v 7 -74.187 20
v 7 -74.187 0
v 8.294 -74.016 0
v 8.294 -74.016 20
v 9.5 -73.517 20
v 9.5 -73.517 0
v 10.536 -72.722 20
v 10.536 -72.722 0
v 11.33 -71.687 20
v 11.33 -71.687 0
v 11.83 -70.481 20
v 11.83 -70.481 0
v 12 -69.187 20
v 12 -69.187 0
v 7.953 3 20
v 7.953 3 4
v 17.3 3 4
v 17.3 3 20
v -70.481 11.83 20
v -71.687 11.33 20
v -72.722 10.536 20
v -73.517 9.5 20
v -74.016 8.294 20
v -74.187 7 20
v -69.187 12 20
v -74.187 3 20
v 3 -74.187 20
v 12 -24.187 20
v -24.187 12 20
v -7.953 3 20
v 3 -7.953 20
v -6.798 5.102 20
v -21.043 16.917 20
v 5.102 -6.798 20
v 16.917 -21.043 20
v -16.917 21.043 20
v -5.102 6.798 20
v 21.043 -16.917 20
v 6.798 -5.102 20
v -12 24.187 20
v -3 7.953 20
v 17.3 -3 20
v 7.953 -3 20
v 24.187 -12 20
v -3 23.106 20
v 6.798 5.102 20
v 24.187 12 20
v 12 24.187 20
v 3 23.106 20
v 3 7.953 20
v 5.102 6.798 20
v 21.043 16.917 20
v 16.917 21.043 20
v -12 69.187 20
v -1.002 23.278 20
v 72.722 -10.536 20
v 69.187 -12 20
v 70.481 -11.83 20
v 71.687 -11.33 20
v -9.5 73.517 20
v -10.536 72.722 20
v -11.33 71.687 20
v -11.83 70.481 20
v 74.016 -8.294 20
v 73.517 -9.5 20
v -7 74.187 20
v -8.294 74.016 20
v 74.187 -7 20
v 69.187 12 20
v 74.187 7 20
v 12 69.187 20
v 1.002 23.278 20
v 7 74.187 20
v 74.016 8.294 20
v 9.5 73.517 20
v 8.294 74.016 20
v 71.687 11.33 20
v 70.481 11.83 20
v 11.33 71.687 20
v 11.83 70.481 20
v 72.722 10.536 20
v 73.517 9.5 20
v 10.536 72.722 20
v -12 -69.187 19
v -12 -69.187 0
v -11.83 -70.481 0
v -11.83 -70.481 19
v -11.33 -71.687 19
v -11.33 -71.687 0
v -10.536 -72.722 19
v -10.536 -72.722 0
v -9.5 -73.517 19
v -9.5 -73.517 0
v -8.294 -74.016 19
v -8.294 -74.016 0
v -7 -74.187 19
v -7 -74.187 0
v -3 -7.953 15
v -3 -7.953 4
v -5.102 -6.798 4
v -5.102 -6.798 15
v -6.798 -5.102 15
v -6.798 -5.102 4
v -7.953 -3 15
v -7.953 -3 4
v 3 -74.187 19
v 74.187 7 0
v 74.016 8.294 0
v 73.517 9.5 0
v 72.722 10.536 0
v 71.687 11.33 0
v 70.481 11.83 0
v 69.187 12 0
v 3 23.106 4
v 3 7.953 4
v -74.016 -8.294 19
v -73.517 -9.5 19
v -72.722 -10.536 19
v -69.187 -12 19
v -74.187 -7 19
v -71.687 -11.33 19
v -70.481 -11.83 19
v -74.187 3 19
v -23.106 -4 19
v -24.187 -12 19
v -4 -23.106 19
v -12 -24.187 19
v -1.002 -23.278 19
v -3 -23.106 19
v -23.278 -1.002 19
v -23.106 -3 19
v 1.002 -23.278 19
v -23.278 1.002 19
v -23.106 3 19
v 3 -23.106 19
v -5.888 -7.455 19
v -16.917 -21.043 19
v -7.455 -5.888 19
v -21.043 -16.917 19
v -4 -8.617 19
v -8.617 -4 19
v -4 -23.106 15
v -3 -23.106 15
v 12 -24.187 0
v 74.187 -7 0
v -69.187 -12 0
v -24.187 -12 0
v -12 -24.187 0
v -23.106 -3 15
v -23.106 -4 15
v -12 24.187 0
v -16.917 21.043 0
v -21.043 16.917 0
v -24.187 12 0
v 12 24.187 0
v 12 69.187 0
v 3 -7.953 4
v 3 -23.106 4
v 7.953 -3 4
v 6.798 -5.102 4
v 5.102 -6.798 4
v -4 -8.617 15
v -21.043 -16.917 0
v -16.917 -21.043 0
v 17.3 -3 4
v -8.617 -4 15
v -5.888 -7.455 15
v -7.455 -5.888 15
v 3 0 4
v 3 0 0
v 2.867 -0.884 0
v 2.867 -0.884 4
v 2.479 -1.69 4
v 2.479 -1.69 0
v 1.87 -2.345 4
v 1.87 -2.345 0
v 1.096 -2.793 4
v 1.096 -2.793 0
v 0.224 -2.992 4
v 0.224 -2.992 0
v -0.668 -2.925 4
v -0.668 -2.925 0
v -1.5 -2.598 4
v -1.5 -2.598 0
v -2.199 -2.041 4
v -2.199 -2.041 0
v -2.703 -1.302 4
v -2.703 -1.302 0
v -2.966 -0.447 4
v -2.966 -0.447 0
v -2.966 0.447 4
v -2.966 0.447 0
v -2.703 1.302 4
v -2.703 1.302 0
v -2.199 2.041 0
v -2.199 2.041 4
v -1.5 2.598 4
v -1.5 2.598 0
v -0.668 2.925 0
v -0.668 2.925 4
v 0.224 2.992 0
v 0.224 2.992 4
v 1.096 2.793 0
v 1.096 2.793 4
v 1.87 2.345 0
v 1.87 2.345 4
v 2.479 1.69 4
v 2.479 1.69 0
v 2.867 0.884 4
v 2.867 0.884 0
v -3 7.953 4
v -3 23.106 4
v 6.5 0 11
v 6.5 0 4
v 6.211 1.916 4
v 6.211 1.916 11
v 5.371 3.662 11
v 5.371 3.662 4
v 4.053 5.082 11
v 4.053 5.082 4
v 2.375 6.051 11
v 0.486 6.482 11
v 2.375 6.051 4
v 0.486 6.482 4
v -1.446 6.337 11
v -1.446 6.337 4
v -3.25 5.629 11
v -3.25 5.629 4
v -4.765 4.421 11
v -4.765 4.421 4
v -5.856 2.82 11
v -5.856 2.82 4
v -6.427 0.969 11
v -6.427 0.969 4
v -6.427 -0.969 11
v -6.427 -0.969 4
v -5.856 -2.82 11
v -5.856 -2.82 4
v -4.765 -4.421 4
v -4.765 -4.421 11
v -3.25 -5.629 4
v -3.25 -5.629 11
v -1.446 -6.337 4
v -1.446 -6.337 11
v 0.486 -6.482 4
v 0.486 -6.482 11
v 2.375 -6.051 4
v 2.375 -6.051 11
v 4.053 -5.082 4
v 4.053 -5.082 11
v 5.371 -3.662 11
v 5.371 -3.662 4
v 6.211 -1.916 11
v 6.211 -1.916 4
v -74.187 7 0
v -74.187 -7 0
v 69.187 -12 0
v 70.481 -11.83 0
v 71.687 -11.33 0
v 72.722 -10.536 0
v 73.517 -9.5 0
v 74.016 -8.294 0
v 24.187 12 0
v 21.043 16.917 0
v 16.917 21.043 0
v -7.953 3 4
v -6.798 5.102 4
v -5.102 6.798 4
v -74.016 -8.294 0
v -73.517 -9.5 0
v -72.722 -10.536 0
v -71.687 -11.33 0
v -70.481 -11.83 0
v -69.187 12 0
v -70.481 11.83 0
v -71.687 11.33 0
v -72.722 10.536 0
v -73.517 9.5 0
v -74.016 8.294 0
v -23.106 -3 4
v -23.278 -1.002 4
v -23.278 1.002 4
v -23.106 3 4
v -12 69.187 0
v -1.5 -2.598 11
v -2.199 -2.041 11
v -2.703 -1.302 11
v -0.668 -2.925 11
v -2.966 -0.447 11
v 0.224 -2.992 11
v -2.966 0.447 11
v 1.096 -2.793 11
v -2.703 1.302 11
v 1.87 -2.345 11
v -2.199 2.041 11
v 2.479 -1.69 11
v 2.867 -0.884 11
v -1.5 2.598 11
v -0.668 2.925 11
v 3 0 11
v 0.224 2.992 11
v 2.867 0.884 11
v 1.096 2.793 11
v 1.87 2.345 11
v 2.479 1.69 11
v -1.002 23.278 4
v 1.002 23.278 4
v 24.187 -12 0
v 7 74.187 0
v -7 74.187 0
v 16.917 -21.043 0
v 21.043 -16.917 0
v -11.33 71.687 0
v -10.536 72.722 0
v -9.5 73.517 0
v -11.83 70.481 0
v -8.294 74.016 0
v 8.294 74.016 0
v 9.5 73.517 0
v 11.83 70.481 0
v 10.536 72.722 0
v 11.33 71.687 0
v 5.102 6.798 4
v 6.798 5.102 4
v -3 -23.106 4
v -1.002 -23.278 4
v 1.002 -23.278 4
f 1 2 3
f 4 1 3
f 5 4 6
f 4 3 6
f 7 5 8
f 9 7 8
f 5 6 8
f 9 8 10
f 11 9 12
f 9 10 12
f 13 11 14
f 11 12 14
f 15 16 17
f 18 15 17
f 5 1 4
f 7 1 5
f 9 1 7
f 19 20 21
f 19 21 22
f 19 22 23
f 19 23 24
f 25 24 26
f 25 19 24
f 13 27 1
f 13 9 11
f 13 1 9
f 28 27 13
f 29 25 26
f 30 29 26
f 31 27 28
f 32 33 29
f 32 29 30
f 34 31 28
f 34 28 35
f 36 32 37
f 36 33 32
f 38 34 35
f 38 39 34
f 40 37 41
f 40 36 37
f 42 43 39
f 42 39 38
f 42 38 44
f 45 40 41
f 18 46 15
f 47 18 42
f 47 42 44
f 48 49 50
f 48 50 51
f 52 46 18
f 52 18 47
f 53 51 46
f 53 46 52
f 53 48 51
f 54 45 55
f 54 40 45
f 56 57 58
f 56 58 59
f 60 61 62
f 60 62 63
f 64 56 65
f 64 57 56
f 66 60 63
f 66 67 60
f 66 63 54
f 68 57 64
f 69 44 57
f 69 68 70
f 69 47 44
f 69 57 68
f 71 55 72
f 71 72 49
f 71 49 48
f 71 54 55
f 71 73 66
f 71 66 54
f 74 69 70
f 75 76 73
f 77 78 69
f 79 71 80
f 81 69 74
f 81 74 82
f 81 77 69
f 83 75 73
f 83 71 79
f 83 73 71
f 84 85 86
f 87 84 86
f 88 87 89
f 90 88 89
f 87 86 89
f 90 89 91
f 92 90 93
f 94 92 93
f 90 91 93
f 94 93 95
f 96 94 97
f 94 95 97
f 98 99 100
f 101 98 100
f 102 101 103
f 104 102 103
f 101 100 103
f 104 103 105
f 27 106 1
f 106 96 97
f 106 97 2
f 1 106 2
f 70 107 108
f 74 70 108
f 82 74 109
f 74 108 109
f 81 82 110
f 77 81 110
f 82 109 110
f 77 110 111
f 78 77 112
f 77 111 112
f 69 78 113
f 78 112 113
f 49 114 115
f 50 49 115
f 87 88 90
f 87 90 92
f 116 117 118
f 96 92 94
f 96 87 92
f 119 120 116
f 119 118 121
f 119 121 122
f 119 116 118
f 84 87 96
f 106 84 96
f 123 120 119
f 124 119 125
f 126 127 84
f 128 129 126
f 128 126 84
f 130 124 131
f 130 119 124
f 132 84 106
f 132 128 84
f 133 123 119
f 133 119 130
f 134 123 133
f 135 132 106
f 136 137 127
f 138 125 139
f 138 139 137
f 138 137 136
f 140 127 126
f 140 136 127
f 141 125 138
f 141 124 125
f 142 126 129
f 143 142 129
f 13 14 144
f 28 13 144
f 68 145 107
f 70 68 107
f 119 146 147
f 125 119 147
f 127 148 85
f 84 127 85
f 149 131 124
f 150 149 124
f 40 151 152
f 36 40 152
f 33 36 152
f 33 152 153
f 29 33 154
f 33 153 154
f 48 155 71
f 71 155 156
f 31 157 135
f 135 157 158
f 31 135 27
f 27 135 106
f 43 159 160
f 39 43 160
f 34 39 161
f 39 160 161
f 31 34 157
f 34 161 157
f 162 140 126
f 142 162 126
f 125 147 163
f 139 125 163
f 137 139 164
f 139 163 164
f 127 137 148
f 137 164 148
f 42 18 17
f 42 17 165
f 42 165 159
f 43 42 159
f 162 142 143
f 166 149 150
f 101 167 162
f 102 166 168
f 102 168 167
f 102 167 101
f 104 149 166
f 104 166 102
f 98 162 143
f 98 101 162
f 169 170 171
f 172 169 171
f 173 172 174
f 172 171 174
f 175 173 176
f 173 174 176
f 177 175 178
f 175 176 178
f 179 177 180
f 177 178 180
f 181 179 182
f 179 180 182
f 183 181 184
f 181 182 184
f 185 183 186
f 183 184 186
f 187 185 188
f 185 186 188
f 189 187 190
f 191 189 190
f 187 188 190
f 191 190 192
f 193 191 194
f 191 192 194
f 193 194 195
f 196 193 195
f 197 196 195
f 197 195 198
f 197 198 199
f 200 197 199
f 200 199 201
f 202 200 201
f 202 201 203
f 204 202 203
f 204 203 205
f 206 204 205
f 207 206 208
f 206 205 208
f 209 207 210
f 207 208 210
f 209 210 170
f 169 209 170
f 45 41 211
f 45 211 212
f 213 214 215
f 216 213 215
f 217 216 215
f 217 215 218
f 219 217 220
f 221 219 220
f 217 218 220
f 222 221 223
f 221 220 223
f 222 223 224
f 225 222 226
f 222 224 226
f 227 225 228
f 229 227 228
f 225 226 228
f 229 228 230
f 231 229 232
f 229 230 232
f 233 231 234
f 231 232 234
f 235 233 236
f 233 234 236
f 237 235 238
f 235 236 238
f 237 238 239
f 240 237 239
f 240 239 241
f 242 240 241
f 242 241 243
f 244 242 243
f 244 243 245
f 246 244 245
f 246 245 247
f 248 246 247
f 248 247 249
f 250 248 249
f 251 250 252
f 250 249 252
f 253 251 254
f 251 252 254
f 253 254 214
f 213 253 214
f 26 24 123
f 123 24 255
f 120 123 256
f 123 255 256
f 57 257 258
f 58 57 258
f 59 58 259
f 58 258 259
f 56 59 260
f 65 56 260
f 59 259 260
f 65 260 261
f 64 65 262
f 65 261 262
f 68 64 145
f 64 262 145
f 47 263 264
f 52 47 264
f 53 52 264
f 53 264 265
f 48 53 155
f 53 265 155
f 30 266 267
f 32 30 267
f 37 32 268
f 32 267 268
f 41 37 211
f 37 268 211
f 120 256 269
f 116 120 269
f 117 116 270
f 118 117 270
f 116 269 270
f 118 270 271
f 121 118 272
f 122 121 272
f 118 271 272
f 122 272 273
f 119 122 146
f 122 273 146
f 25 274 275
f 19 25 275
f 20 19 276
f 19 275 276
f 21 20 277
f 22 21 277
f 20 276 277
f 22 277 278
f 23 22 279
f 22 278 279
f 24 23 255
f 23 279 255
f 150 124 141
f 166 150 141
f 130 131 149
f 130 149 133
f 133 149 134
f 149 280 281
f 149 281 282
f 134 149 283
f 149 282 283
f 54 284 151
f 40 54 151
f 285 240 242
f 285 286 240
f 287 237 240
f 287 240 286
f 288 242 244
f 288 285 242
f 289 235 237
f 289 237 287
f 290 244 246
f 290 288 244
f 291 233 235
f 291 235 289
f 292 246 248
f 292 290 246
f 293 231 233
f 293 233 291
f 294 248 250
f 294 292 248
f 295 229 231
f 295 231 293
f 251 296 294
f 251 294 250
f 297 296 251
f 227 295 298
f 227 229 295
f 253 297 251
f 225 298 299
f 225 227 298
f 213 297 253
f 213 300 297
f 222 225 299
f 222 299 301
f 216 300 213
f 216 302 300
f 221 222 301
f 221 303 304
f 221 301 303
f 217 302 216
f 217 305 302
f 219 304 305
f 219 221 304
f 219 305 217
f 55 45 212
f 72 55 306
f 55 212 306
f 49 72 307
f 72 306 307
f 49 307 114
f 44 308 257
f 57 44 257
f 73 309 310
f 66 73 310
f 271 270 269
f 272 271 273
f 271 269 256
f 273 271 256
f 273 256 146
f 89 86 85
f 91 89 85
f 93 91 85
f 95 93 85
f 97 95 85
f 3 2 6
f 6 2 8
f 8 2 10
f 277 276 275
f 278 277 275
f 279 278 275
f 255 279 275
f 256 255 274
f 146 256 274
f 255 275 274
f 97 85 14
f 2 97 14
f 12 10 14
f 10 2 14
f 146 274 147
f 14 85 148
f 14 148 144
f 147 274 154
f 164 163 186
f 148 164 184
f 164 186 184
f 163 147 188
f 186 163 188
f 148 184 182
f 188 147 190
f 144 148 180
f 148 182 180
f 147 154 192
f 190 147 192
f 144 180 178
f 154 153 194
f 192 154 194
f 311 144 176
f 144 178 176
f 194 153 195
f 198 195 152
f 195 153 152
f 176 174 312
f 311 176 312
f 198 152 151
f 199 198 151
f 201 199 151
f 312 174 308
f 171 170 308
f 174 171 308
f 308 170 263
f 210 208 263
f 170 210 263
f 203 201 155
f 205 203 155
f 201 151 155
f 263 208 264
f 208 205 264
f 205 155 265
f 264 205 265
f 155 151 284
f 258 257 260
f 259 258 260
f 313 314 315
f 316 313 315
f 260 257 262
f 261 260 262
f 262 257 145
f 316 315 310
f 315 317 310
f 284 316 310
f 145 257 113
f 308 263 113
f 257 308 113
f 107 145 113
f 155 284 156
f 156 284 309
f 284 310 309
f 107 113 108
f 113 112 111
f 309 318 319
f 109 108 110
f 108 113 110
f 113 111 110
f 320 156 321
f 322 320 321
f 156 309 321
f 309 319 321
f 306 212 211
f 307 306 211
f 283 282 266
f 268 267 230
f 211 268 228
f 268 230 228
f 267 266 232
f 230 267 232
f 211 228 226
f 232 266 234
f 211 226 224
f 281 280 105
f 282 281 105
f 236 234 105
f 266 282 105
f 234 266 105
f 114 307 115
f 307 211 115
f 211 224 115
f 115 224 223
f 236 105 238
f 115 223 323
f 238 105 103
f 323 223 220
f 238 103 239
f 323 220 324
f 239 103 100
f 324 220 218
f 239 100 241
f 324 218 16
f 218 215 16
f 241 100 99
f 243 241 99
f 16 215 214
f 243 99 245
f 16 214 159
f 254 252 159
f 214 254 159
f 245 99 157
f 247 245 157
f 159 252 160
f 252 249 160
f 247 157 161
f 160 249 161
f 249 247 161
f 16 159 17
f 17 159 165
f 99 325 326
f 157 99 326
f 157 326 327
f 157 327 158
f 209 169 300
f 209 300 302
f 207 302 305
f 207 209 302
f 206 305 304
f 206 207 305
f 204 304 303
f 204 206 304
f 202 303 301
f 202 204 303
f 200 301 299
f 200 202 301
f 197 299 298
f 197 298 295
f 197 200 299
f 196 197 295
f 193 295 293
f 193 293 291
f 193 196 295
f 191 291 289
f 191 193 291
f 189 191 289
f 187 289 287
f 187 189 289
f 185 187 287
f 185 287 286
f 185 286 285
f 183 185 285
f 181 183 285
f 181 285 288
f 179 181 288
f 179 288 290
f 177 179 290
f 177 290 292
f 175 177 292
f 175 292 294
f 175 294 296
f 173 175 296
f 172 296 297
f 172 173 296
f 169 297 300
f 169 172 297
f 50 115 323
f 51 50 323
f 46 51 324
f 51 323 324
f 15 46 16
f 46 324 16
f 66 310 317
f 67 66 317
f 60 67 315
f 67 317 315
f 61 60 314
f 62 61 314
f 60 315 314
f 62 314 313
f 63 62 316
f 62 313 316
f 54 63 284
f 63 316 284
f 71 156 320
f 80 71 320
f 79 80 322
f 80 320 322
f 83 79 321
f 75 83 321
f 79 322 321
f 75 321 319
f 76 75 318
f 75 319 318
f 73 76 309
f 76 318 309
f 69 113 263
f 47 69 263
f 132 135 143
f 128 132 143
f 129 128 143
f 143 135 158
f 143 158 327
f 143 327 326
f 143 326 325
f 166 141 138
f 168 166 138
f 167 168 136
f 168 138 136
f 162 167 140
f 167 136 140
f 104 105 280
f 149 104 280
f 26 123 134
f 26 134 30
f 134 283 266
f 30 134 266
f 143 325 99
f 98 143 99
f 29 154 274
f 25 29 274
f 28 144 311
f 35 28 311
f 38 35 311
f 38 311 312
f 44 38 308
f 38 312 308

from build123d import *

# Parameters (mm, degrees)
F1_DEPTH = 20
F3_DEPTH = 1
F5_DEPTH = 4
F6_R     = 3
F7_DEPTH = 4
F8_R     = 6.5
F8_R_2   = 3
F9_DEPTH = 7


with BuildPart() as f1:
    # F0 (on Top) → F1 (new body)
    with BuildSketch(Plane.XY):
        with BuildLine():
            ThreePointArc((-24.1867732449, -12), (-27, 0), (-24.1867732449, 12))
            Line((-24.1867732449, 12), (-69.1867732449, 12))
            ThreePointArc((-69.1867732449, 12), (-72.7223071508, 10.5355339059), (-74.1867732449, 7))
            Line((-74.1867732449, 7), (-74.1867732449, -7))
            ThreePointArc((-74.1867732449, -7), (-72.7223071508, -10.5355339059), (-69.1867732449, -12))
            Line((-69.1867732449, -12), (-24.1867732449, -12))
        make_face()
        with BuildLine():
            ThreePointArc((24.1867732449, -12), (26.2872866383, -6.1626748408), (27, 0))
            ThreePointArc((27, 0), (26.2872866383, 6.1626748408), (24.1867732449, 12))
            ThreePointArc((24.1867732449, 12), (19.091883092, 19.091883092), (12, 24.1867732449))
            ThreePointArc((12, 24.1867732449), (0, 27), (-12, 24.1867732449))
            ThreePointArc((-12, 24.1867732449), (-19.091883092, 19.091883092), (-24.1867732449, 12))
            ThreePointArc((-24.1867732449, 12), (-27, 0), (-24.1867732449, -12))
            ThreePointArc((-24.1867732449, -12), (-19.091883092, -19.091883092), (-12, -24.1867732449))
            ThreePointArc((-12, -24.1867732449), (0, -27), (12, -24.1867732449))
            ThreePointArc((12, -24.1867732449), (19.091883092, -19.091883092), (24.1867732449, -12))
        make_face()
        with BuildLine():
            ThreePointArc((3, 23.1060598112), (17.5041423669, 15.3783939343), (23.3, 0))
            ThreePointArc((23.3, 0), (17.5041423669, -15.3783939343), (3, -23.1060598112))
            ThreePointArc((3, -23.1060598112), (0, -23.3), (-3, -23.1060598112))
            ThreePointArc((-3, -23.1060598112), (-16.4755880016, -16.4755880016), (-23.1060598112, -3))
            ThreePointArc((-23.1060598112, -3), (-23.3, 0), (-23.1060598112, 3))
            ThreePointArc((-23.1060598112, 3), (-16.4755880016, 16.4755880016), (-3, 23.1060598112))
            ThreePointArc((-3, 23.1060598112), (0, 23.3), (3, 23.1060598112))
        make_face(mode=Mode.SUBTRACT)
        with BuildLine():
            Line((-3, 7.9529868603), (-3, 23.1060598112))
            ThreePointArc((-3, 23.1060598112), (-16.4755880016, 16.4755880016), (-23.1060598112, 3))
            Line((-23.1060598112, 3), (-7.9529868603, 3))
            ThreePointArc((-7.9529868603, 3), (-6.0104076401, 6.0104076401), (-3, 7.9529868603))
        make_face()
        with BuildLine():
            ThreePointArc((3, -23.1060598112), (17.5041423669, -15.3783939343), (23.3, 0))
            ThreePointArc((23.3, 0), (17.5041423669, 15.3783939343), (3, 23.1060598112))
            Line((3, 23.1060598112), (3, 7.9529868603))
            ThreePointArc((3, 7.9529868603), (6.0104076401, 6.0104076401), (7.9529868603, 3))
            Line((7.9529868603, 3), (17.3, 3))
            Line((17.3, 3), (17.3, -3))
            Line((17.3, -3), (7.9529868603, -3))
            ThreePointArc((7.9529868603, -3), (6.0104076401, -6.0104076401), (3, -7.9529868603))
            Line((3, -7.9529868603), (3, -23.1060598112))
        make_face()
        with BuildLine():
            ThreePointArc((-23.1060598112, -3), (-16.4755880016, -16.4755880016), (-3, -23.1060598112))
            Line((-3, -23.1060598112), (-3, -7.9529868603))
            ThreePointArc((-3, -7.9529868603), (-6.0104076401, -6.0104076401), (-7.9529868603, -3))
            Line((-7.9529868603, -3), (-23.1060598112, -3))
        make_face()
        with BuildLine():
            ThreePointArc((-12, 24.1867732449), (0, 27), (12, 24.1867732449))
            Line((12, 24.1867732449), (12, 69.1867732449))
            ThreePointArc((12, 69.1867732449), (10.5355339059, 72.7223071508), (7, 74.1867732449))
            Line((7, 74.1867732449), (-7, 74.1867732449))
            ThreePointArc((-7, 74.1867732449), (-10.5355339059, 72.7223071508), (-12, 69.1867732449))
            Line((-12, 69.1867732449), (-12, 24.1867732449))
        make_face()
        with BuildLine():
            ThreePointArc((24.1867732449, 12), (26.2872866383, 6.1626748408), (27, 0))
            ThreePointArc((27, 0), (26.2872866383, -6.1626748408), (24.1867732449, -12))
            Line((24.1867732449, -12), (69.1867732449, -12))
            ThreePointArc((69.1867732449, -12), (72.7223071508, -10.5355339059), (74.1867732449, -7))
            Line((74.1867732449, -7), (74.1867732449, 7))
            ThreePointArc((74.1867732449, 7), (72.7223071508, 10.5355339059), (69.1867732449, 12))
            Line((69.1867732449, 12), (24.1867732449, 12))
        make_face()
        with BuildLine():
            Line((12, -69.1867732449), (12, -24.1867732449))
            ThreePointArc((12, -24.1867732449), (0, -27), (-12, -24.1867732449))
            Line((-12, -24.1867732449), (-12, -69.1867732449))
            ThreePointArc((-12, -69.1867732449), (-10.5355339059, -72.7223071508), (-7, -74.1867732449))
            Line((-7, -74.1867732449), (7, -74.1867732449))
            ThreePointArc((7, -74.1867732449), (10.5355339059, -72.7223071508), (12, -69.1867732449))
        make_face()
    extrude(amount=F1_DEPTH)

    # F2 (on face) → F3 (cut)
    with BuildSketch(Plane.XY.offset(20)):
        with BuildLine():
            Line((3, -74.1867732449), (3, -23.1060598112))
            ThreePointArc((3, -23.1060598112), (0, -23.3), (-3, -23.1060598112))
            Line((-3, -23.1060598112), (-3, -7.9529868603))
            ThreePointArc((-3, -7.9529868603), (-6.0104076401, -6.0104076401), (-7.9529868603, -3))
            Line((-7.9529868603, -3), (-23.1060598112, -3))
            ThreePointArc((-23.1060598112, -3), (-23.3, 0), (-23.1060598112, 3))
            Line((-23.1060598112, 3), (-74.1867732449, 3))
            Line((-74.1867732449, 3), (-74.1867732449, -7))
            ThreePointArc((-74.1867732449, -7), (-72.7223071508, -10.5355339059), (-69.1867732449, -12))
            Line((-69.1867732449, -12), (-24.1867732449, -12))
            ThreePointArc((-24.1867732449, -12), (-19.091883092, -19.091883092), (-12, -24.1867732449))
            Line((-12, -24.1867732449), (-12, -69.1867732449))
            ThreePointArc((-12, -69.1867732449), (-10.5355339059, -72.7223071508), (-7, -74.1867732449))
            Line((-7, -74.1867732449), (3, -74.1867732449))
        make_face()
    extrude(amount=-F3_DEPTH, mode=Mode.SUBTRACT)

    # F4 (on face) → F5 (cut)
    with BuildSketch(Plane.XY.offset(19)):
        with BuildLine():
            ThreePointArc((-8.6168439698, -4), (-6.7175144213, -6.7175144213), (-4, -8.6168439698))
            Line((-4, -8.6168439698), (-4, -23.1060598112))
            Line((-4, -23.1060598112), (-3, -23.1060598112))
            Line((-3, -23.1060598112), (-3, -7.9529868603))
            ThreePointArc((-3, -7.9529868603), (-6.0104076401, -6.0104076401), (-7.9529868603, -3))
            Line((-7.9529868603, -3), (-23.1060598112, -3))
            Line((-23.1060598112, -3), (-23.1060598112, -4))
            Line((-23.1060598112, -4), (-8.6168439698, -4))
        make_face()
    extrude(amount=-F5_DEPTH, mode=Mode.SUBTRACT)

    # F6 (on face) → F7 (join)
    with BuildSketch(Plane(origin=(0, 0, 0), x_dir=(1, 0, 0), z_dir=(0, 0, -1))):
        with BuildLine():
            ThreePointArc((-74.1867732449, -7), (-72.7223071508, -10.5355339059), (-69.1867732449, -12))
            Line((-69.1867732449, -12), (-24.1867732449, -12))
            ThreePointArc((-24.1867732449, -12), (-19.091883092, -19.091883092), (-12, -24.1867732449))
            Line((-12, -24.1867732449), (-12, -69.1867732449))
            ThreePointArc((-12, -69.1867732449), (-10.5355339059, -72.7223071508), (-7, -74.1867732449))
            Line((-7, -74.1867732449), (7, -74.1867732449))
            ThreePointArc((7, -74.1867732449), (10.5355339059, -72.7223071508), (12, -69.1867732449))
            Line((12, -69.1867732449), (12, -24.1867732449))
            ThreePointArc((12, -24.1867732449), (19.091883092, -19.091883092), (24.1867732449, -12))
            Line((24.1867732449, -12), (69.1867732449, -12))
            ThreePointArc((69.1867732449, -12), (72.7223071508, -10.5355339059), (74.1867732449, -7))
            Line((74.1867732449, -7), (74.1867732449, 7))
            ThreePointArc((74.1867732449, 7), (72.7223071508, 10.5355339059), (69.1867732449, 12))
            Line((69.1867732449, 12), (24.1867732449, 12))
            ThreePointArc((24.1867732449, 12), (19.091883092, 19.091883092), (12, 24.1867732449))
            Line((12, 24.1867732449), (12, 69.1867732449))
            ThreePointArc((12, 69.1867732449), (10.5355339059, 72.7223071508), (7, 74.1867732449))
            Line((7, 74.1867732449), (-7, 74.1867732449))
            ThreePointArc((-7, 74.1867732449), (-10.5355339059, 72.7223071508), (-12, 69.1867732449))
            Line((-12, 69.1867732449), (-12, 24.1867732449))
            ThreePointArc((-12, 24.1867732449), (-19.091883092, 19.091883092), (-24.1867732449, 12))
            Line((-24.1867732449, 12), (-69.1867732449, 12))
            ThreePointArc((-69.1867732449, 12), (-72.7223071508, 10.5355339059), (-74.1867732449, 7))
            Line((-74.1867732449, 7), (-74.1867732449, -7))
        make_face()
        with BuildLine():
            Line((3, -7.9529868603), (3, -23.1060598112))
            ThreePointArc((3, -23.1060598112), (0, -23.3), (-3, -23.1060598112))
            Line((-3, -23.1060598112), (-3, -7.9529868603))
            ThreePointArc((-3, -7.9529868603), (-6.0104076401, -6.0104076401), (-7.9529868603, -3))
            Line((-7.9529868603, -3), (-23.1060598112, -3))
            ThreePointArc((-23.1060598112, -3), (-23.3, 0), (-23.1060598112, 3))
            Line((-23.1060598112, 3), (-7.9529868603, 3))
            ThreePointArc((-7.9529868603, 3), (-6.0104076401, 6.0104076401), (-3, 7.9529868603))
            Line((-3, 7.9529868603), (-3, 23.1060598112))
            ThreePointArc((-3, 23.1060598112), (0, 23.3), (3, 23.1060598112))
            Line((3, 23.1060598112), (3, 7.9529868603))
            ThreePointArc((3, 7.9529868603), (6.0104076401, 6.0104076401), (7.9529868603, 3))
            Line((7.9529868603, 3), (17.3, 3))
            Line((17.3, 3), (17.3, -3))
            Line((17.3, -3), (7.9529868603, -3))
            ThreePointArc((7.9529868603, -3), (6.0104076401, -6.0104076401), (3, -7.9529868603))
        make_face(mode=Mode.SUBTRACT)
        with BuildLine():
            ThreePointArc((-3, -23.1060598112), (0, -23.3), (3, -23.1060598112))
            Line((3, -23.1060598112), (3, -7.9529868603))
            ThreePointArc((3, -7.9529868603), (6.0104076401, -6.0104076401), (7.9529868603, -3))
            Line((7.9529868603, -3), (17.3, -3))
            Line((17.3, -3), (17.3, 3))
            Line((17.3, 3), (7.9529868603, 3))
            ThreePointArc((7.9529868603, 3), (6.0104076401, 6.0104076401), (3, 7.9529868603))
            Line((3, 7.9529868603), (3, 23.1060598112))
            ThreePointArc((3, 23.1060598112), (0, 23.3), (-3, 23.1060598112))
            Line((-3, 23.1060598112), (-3, 7.9529868603))
            ThreePointArc((-3, 7.9529868603), (-6.0104076401, 6.0104076401), (-7.9529868603, 3))
            Line((-7.9529868603, 3), (-23.1060598112, 3))
            ThreePointArc((-23.1060598112, 3), (-23.3, 0), (-23.1060598112, -3))
            Line((-23.1060598112, -3), (-7.9529868603, -3))
            ThreePointArc((-7.9529868603, -3), (-6.0104076401, -6.0104076401), (-3, -7.9529868603))
            Line((-3, -7.9529868603), (-3, -23.1060598112))
        make_face()
        Circle(F6_R, mode=Mode.SUBTRACT)
    extrude(amount=-F7_DEPTH)

    # F8 (on face) → F9 (join)
    with BuildSketch(Plane.XY.offset(4)):
        Circle(F8_R)
        Circle(F8_R_2, mode=Mode.SUBTRACT)
    extrude(amount=F9_DEPTH)


solid = f1.part
